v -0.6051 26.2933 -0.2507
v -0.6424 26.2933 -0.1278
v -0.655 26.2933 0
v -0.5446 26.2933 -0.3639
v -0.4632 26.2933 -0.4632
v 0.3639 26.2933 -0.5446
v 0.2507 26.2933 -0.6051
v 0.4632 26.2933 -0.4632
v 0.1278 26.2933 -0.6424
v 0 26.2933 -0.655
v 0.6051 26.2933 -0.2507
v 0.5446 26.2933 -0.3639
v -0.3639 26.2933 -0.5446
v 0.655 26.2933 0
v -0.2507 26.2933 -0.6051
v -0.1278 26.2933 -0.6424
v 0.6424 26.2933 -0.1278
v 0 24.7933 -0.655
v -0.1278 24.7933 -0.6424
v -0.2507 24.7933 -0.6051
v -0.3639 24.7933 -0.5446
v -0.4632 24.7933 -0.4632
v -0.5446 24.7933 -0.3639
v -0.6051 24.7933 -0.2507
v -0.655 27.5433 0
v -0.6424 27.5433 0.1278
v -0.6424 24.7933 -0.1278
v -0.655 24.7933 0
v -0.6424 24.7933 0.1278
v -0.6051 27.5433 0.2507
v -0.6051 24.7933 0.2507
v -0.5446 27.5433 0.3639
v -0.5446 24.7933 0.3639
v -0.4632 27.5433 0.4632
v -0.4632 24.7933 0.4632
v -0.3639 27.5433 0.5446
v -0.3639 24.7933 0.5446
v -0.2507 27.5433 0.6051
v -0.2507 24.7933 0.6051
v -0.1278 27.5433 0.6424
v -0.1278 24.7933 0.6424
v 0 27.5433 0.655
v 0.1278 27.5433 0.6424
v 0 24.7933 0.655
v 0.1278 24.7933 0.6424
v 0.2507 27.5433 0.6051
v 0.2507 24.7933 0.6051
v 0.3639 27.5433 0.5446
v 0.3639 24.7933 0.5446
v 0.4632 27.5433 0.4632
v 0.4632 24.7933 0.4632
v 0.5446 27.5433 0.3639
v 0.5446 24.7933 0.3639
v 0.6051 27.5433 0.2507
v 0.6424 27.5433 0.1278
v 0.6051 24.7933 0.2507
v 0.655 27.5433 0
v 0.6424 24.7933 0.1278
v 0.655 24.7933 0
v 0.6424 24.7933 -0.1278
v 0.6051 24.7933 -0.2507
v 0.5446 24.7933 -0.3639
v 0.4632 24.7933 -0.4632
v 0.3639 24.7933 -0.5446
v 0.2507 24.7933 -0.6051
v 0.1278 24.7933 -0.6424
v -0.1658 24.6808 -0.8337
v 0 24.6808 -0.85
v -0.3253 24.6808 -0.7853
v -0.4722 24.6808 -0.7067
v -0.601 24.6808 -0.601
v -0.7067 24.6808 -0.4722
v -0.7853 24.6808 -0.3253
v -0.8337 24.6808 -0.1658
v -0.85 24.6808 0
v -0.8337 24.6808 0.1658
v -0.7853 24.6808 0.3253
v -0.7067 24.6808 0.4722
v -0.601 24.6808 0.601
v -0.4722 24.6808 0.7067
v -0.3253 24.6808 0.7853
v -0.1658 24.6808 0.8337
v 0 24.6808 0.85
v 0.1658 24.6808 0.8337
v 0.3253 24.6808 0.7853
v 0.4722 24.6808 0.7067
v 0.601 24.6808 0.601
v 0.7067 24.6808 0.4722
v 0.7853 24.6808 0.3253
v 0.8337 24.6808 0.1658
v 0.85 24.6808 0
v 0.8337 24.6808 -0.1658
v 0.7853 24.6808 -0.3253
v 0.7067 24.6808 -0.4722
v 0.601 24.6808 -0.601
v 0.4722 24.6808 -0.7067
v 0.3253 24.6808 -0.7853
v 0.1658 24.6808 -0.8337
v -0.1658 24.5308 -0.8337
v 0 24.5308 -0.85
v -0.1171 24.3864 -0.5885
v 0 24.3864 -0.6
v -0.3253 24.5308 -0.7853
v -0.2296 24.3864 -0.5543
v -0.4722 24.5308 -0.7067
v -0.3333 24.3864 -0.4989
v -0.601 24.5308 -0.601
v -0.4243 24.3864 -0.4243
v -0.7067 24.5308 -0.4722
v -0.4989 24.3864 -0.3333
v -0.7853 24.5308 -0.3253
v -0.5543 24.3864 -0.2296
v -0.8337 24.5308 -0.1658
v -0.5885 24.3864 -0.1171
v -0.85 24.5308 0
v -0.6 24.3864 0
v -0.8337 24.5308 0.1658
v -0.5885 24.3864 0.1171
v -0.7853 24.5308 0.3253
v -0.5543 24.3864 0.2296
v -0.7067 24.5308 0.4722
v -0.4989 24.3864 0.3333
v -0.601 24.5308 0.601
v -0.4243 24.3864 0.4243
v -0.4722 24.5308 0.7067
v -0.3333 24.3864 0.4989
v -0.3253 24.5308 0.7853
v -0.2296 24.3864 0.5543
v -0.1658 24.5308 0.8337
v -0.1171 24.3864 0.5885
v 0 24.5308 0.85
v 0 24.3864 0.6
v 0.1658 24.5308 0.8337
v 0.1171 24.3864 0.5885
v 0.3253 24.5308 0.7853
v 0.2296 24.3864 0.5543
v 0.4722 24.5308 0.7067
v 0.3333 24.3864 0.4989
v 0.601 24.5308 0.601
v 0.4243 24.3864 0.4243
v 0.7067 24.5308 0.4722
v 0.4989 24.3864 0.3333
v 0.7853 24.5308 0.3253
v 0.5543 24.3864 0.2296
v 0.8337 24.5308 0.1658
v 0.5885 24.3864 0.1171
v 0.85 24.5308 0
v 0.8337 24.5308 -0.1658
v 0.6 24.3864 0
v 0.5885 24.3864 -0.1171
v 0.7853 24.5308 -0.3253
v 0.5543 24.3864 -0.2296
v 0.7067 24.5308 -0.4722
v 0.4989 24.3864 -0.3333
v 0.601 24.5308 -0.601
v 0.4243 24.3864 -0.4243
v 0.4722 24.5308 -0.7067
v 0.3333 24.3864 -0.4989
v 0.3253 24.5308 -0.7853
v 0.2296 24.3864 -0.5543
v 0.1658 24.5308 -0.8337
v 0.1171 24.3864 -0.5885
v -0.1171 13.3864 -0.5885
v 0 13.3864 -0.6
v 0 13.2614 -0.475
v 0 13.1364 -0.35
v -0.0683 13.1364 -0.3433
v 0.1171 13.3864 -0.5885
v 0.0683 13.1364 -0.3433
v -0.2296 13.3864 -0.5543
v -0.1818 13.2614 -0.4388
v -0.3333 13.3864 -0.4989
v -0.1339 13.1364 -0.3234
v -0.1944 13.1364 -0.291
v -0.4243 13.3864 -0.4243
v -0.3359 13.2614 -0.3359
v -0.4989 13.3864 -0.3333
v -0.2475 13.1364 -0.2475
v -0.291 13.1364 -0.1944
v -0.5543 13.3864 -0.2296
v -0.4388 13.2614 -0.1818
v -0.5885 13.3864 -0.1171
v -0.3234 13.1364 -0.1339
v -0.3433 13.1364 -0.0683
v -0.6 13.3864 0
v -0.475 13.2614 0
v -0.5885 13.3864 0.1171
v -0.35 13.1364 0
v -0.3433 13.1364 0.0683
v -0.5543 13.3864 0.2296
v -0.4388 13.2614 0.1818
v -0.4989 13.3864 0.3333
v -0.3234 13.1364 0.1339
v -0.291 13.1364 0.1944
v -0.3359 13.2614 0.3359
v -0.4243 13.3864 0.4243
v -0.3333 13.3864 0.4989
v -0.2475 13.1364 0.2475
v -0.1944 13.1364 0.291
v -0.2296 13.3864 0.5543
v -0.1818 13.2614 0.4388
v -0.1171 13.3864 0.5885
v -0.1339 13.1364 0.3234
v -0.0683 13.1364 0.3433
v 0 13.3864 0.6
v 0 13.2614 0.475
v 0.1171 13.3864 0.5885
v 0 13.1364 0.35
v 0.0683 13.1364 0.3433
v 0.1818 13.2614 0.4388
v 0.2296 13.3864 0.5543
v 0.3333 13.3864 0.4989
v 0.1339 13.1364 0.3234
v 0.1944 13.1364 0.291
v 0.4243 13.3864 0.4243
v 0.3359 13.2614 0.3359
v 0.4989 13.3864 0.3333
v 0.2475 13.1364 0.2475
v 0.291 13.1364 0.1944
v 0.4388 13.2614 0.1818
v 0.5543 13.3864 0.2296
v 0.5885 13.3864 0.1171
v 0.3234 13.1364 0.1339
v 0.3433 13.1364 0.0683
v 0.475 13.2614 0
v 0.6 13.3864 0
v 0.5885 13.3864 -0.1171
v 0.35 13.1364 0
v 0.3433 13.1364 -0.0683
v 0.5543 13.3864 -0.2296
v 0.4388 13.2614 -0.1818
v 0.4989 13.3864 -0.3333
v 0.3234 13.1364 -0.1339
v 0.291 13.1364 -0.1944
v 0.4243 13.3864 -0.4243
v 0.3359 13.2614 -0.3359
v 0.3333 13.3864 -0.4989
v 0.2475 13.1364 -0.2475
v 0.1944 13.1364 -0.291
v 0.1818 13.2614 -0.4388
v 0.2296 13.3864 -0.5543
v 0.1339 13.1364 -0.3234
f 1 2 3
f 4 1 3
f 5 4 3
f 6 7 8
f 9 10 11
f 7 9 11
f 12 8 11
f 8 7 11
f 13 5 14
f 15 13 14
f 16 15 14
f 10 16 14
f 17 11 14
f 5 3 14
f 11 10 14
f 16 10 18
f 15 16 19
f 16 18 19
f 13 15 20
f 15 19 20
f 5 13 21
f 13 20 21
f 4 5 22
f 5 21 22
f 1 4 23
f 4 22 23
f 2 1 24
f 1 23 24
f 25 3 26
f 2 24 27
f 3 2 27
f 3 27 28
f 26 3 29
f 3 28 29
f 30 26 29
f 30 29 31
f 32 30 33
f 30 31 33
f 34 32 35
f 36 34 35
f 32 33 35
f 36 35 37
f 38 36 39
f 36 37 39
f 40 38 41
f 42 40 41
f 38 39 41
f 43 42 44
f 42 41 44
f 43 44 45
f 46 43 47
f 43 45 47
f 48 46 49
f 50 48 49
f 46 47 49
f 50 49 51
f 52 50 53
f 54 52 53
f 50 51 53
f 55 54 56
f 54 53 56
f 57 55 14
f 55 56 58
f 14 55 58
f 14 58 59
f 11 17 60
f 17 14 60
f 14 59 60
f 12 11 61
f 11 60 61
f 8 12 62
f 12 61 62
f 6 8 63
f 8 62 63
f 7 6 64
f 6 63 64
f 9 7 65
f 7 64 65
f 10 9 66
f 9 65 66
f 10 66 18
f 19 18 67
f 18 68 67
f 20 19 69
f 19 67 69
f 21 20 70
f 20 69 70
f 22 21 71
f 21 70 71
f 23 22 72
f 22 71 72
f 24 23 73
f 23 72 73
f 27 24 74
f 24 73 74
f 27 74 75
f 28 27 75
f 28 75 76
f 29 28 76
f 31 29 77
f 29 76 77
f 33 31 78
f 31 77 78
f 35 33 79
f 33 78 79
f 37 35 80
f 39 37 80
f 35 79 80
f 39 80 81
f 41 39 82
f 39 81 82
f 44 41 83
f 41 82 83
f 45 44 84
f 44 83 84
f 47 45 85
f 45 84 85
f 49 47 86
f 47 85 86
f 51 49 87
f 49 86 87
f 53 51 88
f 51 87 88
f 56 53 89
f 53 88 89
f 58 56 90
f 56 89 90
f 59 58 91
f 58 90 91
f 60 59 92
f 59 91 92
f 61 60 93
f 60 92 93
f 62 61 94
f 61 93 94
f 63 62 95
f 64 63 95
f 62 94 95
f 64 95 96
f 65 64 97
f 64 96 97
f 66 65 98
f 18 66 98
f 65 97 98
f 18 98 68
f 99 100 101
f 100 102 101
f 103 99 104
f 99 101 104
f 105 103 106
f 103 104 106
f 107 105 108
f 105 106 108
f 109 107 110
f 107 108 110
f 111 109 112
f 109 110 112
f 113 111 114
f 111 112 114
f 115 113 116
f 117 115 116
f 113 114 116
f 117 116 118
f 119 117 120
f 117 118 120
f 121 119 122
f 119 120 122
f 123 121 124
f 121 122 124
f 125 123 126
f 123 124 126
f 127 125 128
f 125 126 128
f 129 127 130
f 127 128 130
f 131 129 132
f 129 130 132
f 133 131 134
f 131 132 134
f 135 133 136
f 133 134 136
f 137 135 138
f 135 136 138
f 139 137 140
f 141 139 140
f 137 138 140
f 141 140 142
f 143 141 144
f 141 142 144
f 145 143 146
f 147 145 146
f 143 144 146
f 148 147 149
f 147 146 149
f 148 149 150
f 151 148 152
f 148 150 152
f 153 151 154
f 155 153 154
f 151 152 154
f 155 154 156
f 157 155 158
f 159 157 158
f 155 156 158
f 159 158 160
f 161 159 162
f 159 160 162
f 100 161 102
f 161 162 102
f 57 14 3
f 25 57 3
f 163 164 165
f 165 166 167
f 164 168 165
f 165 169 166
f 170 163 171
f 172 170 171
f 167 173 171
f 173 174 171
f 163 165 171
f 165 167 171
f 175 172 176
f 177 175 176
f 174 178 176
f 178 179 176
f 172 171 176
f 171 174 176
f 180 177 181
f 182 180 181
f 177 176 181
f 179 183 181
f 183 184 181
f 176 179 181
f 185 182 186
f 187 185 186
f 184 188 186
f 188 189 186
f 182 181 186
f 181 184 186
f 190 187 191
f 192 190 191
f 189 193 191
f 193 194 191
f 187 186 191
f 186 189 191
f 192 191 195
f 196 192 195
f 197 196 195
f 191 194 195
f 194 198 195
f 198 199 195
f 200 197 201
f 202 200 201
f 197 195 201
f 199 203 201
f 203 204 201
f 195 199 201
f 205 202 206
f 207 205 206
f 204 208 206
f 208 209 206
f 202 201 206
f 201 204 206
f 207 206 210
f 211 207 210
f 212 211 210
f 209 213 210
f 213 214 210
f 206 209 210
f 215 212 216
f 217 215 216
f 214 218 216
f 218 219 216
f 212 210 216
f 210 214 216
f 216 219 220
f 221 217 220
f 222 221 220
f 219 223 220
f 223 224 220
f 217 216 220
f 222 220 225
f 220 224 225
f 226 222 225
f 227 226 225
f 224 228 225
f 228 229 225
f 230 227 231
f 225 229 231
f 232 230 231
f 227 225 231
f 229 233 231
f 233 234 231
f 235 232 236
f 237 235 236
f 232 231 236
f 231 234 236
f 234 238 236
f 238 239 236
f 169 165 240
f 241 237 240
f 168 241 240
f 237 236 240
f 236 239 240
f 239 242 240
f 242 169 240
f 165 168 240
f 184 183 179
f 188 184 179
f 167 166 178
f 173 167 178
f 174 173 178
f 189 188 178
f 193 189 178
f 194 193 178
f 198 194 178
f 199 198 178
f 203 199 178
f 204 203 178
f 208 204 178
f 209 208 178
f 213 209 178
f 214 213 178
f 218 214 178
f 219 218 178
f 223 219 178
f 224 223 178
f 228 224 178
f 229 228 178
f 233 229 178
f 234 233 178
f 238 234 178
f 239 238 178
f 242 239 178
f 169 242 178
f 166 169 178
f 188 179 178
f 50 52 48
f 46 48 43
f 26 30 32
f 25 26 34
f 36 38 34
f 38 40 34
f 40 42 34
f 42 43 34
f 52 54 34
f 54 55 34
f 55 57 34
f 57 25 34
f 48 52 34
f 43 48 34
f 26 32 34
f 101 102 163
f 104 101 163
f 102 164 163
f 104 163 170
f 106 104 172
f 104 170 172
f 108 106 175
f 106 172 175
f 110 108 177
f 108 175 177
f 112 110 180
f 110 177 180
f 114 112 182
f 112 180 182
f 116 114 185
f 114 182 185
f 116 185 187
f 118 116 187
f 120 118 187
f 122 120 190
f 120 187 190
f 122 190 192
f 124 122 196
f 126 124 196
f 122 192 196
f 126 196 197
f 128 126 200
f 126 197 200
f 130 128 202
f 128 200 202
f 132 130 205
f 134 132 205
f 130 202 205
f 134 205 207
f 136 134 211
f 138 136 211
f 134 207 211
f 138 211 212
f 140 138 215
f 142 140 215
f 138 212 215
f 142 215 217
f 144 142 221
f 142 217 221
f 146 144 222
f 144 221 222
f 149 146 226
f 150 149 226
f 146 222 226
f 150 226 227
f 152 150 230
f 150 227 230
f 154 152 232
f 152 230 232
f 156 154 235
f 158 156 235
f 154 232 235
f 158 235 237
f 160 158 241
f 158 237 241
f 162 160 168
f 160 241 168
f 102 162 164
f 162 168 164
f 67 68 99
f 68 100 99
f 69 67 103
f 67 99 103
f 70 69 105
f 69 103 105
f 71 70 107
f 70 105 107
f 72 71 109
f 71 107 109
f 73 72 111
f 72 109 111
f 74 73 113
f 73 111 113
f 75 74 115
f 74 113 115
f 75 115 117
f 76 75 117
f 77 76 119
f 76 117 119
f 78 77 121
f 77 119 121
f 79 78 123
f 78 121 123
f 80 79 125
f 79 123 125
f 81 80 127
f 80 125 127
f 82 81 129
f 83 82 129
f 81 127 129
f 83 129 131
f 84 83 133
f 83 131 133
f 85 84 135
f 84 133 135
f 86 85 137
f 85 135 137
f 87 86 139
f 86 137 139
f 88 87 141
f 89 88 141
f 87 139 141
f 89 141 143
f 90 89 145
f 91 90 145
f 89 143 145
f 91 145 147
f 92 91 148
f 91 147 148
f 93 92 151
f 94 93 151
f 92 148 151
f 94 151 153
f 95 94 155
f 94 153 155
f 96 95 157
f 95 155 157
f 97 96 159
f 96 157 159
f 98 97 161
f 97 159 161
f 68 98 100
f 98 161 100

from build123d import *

# Parameters (mm, degrees)
CUT_EXTRUDE1_START = -1.25
CUT_EXTRUDE1_DEPTH = 1.25


with BuildPart() as part:
    # Sketch1 → Revolve1 (revolve)
    with BuildSketch(Plane.XY):
        Polygon((0.6, 24.386414327), (0.6, 13.386414327), (0.35, 13.136414327), (0, 13.136414327), (0, 27.543335196), (0.655, 27.543335196), (0.655, 24.793335196), (0.85, 24.680751894), (0.85, 24.530751894), align=None)
    revolve(axis=Axis((0, 0, 0), (0, 1, 0)))

    # Sketch2 → Cut-Extrude1 (cut)
    with BuildSketch(Plane(origin=(0, 27.543335196, 0), x_dir=(-1, 0, 0), z_dir=(0, 1, 0)).offset(CUT_EXTRUDE1_START)):
        with BuildLine():
            Line((-0.655, 0), (0.655, 0))
            ThreePointArc((0.655, 0), (0, -0.655), (-0.655, 0))
        make_face()
    extrude(amount=CUT_EXTRUDE1_DEPTH, mode=Mode.SUBTRACT)


solid = part.part
